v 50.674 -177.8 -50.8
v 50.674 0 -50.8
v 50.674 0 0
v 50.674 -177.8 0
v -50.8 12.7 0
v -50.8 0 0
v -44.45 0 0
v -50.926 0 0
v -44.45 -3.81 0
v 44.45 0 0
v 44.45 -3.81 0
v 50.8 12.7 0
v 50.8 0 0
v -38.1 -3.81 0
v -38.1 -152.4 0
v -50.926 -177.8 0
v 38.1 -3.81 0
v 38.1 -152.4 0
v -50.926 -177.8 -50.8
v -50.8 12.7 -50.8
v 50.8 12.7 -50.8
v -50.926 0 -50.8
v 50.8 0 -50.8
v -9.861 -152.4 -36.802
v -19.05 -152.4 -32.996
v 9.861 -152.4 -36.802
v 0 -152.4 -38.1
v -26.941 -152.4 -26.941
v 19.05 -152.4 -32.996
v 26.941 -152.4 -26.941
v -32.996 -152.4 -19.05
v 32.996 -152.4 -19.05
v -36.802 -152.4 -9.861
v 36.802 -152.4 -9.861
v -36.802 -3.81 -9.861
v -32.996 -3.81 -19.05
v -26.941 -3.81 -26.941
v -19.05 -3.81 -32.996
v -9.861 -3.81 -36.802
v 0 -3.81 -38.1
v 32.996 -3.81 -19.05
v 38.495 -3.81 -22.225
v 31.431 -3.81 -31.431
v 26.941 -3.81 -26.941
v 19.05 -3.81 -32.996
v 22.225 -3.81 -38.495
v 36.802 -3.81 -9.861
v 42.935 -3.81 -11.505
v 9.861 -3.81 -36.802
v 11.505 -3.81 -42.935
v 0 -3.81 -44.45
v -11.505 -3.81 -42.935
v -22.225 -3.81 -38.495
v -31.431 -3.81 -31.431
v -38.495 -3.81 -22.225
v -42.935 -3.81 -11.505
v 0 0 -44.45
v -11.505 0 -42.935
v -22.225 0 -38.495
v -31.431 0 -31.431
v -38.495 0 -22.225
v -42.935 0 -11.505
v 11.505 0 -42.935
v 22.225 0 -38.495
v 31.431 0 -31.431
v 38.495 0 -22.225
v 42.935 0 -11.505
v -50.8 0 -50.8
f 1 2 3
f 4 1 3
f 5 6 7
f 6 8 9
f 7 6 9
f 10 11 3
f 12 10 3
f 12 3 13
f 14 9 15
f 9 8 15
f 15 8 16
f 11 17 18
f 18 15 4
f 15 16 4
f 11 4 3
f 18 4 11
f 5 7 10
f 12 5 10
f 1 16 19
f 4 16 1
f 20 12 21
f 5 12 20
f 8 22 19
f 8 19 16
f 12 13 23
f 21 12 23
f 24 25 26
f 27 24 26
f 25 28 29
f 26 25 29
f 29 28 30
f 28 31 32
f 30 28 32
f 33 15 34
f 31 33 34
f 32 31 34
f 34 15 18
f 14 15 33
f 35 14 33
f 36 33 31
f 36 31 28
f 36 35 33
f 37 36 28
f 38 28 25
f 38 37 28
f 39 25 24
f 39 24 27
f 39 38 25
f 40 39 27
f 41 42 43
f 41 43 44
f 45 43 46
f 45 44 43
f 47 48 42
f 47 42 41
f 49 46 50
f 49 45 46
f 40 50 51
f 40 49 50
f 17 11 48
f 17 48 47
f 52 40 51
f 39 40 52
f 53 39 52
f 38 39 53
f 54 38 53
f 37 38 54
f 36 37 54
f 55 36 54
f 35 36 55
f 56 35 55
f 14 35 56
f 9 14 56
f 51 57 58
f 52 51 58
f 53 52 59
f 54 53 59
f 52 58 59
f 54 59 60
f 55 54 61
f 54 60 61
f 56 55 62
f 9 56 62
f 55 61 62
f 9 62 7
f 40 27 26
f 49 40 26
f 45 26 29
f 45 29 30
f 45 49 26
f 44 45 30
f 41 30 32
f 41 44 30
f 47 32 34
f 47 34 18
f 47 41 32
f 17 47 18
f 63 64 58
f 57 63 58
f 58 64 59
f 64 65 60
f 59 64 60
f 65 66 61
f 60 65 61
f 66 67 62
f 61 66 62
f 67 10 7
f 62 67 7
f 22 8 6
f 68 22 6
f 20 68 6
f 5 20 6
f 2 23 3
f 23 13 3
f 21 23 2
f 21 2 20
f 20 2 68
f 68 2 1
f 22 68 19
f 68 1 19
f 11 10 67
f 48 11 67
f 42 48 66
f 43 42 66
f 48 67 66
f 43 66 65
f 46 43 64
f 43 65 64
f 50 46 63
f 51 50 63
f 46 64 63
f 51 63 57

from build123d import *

# Parameters (mm, degrees)
F0_W     = 101.6
F0_H     = 50.8
F1_DEPTH = 177.8
F4_DEPTH = 152.4
F6_DEPTH = 3.81
F8_DEPTH = 12.7


with BuildPart() as f1:
    # F0 (on Front) → F1 (new body)
    with BuildSketch(Plane.XZ):
        with Locations((-0.1263681454, -25.4)):
            Rectangle(F0_W, F0_H)
    extrude(amount=F1_DEPTH)

    # F3 (on Front) → F4 (cut)
    with BuildSketch(Plane.XZ):
        with BuildLine():
            Line((0, -38.1), (0, 0))
            Line((0, 0), (-38.1, 0))
            ThreePointArc((-38.1, 0), (-26.9407683632, -26.9407683632), (0, -38.1))
        make_face()
        with BuildLine():
            Line((38.1, 0), (0, 0))
            Line((0, 0), (0, -38.1))
            ThreePointArc((0, -38.1), (26.9407683632, -26.9407683632), (38.1, 0))
        make_face()
    extrude(amount=F4_DEPTH, mode=Mode.SUBTRACT)

    # F5 (on face) → F6 (cut)
    with BuildSketch(Plane(origin=(0, 0, 0), x_dir=(-1, 0, 0), z_dir=(0, 1, 0))):
        with BuildLine():
            Line((0, -38.1), (0, -44.45))
            ThreePointArc((0, -44.45), (31.4308964237, -31.4308964237), (44.45, 0))
            Line((44.45, 0), (38.1, 0))
            ThreePointArc((38.1, 0), (26.9407683632, -26.9407683632), (0, -38.1))
        make_face()
        with BuildLine():
            Line((-38.1, 0), (-44.45, 0))
            ThreePointArc((-44.45, 0), (-31.4308964237, -31.4308964237), (0, -44.45))
            Line((0, -44.45), (0, -38.1))
            ThreePointArc((0, -38.1), (-26.9407683632, -26.9407683632), (-38.1, 0))
        make_face()
    extrude(amount=-F6_DEPTH, mode=Mode.SUBTRACT)

    # F7 (on face) → F8 (join)
    with BuildSketch(Plane(origin=(0, 0, 0), x_dir=(-1, 0, 0), z_dir=(0, 1, 0))):
        Polygon((50.8, 0), (0, 0), (-50.8, 0), (-50.8, -50.8), (50.8, -50.8), align=None)
    extrude(amount=F8_DEPTH)


solid = f1.part
